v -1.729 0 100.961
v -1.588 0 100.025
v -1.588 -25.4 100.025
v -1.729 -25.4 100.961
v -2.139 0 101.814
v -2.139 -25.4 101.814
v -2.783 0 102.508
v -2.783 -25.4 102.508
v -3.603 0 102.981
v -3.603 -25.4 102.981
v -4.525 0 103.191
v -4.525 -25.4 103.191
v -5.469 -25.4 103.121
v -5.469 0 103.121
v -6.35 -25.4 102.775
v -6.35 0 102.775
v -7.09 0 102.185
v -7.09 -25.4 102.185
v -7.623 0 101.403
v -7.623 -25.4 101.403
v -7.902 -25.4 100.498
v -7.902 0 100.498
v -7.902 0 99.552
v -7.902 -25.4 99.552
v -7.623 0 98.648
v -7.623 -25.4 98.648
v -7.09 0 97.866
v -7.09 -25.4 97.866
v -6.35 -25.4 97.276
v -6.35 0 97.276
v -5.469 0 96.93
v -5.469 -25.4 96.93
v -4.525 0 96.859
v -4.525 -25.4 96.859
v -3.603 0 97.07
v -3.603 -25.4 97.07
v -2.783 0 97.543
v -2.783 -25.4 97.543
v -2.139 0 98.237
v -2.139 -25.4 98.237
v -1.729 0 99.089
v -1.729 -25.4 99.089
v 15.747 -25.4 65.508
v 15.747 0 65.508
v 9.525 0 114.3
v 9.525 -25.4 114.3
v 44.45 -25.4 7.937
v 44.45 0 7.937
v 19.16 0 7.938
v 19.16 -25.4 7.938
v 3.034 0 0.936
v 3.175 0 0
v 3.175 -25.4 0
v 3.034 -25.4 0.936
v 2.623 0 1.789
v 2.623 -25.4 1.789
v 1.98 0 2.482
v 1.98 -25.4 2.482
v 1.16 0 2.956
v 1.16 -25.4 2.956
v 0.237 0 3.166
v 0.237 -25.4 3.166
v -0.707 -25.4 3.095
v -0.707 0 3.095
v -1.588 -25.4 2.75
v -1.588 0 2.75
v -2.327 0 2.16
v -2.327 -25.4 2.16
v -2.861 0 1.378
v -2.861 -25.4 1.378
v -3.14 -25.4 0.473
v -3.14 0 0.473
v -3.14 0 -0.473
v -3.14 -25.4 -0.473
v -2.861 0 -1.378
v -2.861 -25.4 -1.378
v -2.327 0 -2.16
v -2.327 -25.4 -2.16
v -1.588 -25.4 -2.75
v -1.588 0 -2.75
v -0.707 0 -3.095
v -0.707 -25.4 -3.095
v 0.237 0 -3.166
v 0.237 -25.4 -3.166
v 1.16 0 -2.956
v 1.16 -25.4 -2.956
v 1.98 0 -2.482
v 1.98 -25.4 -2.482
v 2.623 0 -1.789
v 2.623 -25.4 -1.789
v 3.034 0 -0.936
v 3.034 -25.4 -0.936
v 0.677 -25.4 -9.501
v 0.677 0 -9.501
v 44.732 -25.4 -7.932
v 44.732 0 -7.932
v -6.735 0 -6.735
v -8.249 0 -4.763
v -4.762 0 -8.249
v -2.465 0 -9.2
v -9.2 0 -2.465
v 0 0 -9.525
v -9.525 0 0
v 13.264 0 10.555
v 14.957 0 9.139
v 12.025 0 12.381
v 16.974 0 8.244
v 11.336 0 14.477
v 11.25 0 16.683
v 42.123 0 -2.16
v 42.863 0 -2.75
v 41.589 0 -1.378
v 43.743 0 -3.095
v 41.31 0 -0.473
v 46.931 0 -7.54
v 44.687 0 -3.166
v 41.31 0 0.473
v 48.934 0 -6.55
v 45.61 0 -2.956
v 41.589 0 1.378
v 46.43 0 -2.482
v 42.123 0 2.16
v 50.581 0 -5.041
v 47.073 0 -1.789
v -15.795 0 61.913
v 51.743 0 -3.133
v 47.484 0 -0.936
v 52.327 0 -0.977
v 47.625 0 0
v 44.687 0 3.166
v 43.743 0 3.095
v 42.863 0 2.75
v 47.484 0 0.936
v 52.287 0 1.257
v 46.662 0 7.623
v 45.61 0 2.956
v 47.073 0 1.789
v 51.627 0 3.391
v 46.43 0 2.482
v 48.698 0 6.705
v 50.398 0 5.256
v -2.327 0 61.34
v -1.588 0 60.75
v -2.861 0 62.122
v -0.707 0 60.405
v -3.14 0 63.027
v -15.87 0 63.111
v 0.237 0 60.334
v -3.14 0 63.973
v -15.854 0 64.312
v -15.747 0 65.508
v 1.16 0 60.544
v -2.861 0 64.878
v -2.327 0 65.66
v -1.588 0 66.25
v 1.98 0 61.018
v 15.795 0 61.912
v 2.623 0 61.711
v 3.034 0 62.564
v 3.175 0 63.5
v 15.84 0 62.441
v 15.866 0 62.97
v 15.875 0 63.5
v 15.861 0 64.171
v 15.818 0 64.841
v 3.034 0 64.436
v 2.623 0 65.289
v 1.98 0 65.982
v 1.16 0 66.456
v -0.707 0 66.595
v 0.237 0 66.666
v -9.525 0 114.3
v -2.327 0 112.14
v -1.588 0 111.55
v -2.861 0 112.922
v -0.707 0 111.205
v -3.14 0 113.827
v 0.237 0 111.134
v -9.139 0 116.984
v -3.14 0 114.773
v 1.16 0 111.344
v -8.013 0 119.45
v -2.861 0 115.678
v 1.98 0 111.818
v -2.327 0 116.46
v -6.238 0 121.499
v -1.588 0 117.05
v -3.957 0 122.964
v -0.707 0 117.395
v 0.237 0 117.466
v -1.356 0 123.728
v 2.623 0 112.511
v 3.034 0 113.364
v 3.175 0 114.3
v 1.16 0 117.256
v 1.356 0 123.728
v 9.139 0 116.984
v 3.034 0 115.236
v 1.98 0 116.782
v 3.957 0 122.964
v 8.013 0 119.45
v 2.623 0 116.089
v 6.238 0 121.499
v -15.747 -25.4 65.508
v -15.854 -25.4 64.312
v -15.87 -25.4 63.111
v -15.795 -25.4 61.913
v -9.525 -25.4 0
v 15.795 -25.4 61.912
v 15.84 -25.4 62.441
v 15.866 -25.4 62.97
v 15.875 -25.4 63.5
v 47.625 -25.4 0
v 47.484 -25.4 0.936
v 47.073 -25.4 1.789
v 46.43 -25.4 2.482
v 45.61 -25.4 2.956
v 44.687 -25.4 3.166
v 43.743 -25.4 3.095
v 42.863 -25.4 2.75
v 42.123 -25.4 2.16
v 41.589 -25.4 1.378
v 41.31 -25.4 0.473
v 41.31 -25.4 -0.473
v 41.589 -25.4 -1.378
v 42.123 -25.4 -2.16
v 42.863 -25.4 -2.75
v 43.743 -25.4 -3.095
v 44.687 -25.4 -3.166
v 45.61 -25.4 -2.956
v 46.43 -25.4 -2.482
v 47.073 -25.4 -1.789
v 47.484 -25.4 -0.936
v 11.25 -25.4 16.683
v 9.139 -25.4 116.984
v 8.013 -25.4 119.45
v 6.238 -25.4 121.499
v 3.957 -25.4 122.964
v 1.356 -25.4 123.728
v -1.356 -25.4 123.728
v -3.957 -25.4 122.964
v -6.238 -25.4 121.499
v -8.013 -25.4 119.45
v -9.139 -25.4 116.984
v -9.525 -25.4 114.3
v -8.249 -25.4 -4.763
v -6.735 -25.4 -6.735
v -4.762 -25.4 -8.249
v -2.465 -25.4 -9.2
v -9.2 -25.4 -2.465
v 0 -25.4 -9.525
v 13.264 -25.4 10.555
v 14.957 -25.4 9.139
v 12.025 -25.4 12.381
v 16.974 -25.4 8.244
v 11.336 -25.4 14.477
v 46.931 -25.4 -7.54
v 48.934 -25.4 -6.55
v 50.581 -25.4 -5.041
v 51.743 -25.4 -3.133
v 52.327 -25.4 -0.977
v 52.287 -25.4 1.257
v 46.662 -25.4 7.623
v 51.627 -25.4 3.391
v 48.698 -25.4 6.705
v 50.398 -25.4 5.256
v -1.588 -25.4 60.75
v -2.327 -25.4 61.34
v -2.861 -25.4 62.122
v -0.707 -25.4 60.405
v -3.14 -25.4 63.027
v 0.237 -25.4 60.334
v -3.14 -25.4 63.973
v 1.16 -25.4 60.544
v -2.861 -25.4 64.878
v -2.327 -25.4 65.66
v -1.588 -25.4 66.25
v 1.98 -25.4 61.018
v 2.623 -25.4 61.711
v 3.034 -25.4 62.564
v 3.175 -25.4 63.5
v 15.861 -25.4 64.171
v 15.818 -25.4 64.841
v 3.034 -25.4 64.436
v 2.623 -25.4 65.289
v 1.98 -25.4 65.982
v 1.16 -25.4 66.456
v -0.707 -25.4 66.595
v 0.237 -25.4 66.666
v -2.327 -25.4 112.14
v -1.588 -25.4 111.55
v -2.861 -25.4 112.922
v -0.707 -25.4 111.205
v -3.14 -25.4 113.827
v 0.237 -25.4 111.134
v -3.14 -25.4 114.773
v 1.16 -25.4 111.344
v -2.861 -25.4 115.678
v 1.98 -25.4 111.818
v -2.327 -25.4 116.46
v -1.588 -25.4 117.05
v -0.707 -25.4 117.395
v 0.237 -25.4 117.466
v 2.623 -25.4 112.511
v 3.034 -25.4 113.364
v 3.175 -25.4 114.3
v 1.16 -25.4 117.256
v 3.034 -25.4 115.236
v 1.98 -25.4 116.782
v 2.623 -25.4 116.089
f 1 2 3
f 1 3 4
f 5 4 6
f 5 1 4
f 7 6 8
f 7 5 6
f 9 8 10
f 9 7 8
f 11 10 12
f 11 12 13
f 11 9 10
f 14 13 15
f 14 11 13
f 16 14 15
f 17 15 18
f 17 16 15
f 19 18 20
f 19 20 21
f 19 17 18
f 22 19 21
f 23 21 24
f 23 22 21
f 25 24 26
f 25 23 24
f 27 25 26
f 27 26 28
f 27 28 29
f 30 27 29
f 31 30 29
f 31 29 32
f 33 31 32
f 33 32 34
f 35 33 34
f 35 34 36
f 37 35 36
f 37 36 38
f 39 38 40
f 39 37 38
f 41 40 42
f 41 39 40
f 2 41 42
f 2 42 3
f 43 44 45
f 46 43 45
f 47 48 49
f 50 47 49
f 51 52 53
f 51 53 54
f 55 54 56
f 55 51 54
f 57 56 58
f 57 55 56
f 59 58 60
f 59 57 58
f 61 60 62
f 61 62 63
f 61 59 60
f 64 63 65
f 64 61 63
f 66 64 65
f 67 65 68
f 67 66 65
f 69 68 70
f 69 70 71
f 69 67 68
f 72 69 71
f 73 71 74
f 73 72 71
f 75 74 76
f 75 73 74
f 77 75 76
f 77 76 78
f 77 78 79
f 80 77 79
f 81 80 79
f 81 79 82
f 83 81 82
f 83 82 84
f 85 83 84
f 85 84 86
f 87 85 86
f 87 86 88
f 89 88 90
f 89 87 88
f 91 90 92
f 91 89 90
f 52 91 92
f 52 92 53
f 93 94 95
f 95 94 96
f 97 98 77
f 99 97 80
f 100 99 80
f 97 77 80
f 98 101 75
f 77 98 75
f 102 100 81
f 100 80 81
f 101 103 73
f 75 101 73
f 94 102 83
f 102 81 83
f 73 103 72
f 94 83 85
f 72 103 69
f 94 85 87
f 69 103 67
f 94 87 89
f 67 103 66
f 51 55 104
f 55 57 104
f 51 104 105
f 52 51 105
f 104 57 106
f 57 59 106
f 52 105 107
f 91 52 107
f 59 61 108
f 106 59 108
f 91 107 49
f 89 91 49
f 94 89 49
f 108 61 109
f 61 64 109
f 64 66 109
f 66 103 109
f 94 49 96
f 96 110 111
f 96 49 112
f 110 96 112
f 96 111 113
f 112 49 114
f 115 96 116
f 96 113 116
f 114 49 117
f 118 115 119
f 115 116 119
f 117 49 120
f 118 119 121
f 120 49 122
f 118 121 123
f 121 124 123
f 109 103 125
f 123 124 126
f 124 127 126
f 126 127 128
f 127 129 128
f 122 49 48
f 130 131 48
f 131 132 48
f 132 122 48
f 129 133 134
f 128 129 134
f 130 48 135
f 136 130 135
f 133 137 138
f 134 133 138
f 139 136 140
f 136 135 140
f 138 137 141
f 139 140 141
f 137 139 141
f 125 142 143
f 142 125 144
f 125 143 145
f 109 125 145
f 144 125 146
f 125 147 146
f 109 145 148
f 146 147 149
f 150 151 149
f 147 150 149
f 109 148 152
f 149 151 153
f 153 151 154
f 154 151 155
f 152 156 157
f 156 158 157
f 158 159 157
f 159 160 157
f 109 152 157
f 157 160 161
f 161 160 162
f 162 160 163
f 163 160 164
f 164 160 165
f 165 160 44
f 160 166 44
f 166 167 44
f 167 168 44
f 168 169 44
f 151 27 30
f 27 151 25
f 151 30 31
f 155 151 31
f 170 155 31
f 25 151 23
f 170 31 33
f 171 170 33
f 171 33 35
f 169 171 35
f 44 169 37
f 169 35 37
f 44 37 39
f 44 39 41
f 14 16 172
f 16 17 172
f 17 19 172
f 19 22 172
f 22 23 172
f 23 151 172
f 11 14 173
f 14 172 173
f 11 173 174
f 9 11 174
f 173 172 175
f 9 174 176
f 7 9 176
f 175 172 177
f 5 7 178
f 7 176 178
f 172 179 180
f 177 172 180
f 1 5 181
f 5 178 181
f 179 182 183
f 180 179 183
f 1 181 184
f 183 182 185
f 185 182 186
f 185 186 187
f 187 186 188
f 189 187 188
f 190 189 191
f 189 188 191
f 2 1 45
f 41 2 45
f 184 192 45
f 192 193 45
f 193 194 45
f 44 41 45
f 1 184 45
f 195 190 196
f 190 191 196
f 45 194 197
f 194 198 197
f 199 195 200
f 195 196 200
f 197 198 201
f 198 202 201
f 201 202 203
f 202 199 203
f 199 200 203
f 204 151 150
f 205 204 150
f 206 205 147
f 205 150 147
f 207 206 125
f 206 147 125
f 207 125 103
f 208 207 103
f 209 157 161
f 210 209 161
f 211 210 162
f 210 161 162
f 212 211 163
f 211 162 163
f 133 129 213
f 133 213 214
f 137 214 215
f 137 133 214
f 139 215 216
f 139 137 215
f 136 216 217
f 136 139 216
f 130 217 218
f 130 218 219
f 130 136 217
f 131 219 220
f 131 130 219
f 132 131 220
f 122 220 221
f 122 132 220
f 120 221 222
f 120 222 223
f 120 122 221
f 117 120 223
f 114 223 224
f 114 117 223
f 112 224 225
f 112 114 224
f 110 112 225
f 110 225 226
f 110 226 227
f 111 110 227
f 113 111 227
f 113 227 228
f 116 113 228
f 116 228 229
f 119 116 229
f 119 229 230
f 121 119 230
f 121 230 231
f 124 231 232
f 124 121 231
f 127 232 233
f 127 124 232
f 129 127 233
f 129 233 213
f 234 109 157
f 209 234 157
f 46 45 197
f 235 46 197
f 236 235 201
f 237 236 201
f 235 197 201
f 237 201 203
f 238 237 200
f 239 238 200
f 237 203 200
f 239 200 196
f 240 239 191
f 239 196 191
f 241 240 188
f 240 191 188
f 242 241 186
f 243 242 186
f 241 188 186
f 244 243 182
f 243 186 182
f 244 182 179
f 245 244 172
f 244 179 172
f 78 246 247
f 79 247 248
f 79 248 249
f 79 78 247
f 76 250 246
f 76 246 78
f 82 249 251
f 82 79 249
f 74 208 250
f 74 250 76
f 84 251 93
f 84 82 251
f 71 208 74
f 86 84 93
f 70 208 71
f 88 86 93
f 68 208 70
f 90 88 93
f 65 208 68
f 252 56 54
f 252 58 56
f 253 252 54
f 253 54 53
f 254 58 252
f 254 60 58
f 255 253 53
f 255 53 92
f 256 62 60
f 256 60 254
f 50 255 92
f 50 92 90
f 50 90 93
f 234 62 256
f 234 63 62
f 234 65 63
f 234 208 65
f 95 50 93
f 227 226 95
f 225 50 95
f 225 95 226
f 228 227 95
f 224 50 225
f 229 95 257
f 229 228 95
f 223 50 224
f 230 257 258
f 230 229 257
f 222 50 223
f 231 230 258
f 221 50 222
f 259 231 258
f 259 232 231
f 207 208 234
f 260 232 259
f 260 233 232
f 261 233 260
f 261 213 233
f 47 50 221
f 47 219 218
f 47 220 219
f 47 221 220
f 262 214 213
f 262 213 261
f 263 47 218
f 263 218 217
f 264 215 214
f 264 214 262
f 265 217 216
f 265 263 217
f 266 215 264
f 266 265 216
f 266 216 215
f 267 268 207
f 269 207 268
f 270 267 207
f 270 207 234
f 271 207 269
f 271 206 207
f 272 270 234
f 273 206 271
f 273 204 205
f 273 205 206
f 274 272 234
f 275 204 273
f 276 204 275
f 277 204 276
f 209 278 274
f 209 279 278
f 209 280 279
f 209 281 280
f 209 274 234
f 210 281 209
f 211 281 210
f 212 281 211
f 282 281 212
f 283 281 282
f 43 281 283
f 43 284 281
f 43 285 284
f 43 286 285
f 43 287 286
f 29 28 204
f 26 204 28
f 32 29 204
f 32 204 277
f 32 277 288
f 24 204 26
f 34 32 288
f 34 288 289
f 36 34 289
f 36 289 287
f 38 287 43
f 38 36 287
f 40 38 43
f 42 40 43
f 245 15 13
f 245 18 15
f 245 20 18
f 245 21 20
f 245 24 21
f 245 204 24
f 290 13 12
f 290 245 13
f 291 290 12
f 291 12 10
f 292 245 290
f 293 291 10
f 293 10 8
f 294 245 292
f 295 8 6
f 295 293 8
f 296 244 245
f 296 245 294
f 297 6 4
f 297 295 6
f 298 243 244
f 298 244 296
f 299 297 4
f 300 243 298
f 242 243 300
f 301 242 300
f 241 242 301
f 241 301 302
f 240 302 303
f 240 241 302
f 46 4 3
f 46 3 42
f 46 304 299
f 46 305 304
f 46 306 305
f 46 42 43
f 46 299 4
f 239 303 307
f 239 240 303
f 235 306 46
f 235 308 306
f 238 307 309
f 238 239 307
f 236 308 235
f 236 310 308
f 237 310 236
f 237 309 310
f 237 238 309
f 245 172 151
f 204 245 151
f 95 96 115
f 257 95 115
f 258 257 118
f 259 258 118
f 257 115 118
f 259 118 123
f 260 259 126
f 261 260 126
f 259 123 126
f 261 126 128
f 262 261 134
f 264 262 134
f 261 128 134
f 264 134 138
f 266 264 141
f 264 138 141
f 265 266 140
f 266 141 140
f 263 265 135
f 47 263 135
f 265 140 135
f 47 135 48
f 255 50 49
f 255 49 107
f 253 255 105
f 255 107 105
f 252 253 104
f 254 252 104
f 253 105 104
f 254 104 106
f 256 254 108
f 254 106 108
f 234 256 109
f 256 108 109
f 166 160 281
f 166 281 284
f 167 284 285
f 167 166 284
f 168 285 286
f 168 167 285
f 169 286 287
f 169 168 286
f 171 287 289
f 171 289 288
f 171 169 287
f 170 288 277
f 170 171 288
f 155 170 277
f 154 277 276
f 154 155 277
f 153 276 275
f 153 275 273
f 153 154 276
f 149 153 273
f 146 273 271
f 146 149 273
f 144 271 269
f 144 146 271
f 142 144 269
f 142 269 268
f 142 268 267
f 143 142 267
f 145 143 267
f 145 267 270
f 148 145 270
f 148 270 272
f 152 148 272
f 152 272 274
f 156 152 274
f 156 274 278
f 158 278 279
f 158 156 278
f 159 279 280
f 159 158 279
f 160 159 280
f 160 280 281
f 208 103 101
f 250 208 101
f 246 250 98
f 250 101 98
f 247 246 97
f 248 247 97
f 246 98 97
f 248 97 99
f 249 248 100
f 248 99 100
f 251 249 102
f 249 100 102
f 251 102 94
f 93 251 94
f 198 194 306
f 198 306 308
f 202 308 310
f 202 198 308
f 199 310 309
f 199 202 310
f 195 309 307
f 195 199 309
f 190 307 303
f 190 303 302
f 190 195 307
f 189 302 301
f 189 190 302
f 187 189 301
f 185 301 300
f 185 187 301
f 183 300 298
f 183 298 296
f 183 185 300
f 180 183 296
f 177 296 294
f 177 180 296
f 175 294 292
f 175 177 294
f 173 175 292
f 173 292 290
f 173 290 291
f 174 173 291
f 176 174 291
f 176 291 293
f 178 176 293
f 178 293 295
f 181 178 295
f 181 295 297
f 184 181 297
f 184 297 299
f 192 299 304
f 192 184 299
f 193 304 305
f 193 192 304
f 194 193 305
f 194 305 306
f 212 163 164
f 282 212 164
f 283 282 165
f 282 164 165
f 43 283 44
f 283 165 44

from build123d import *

# Parameters (mm, degrees)
F0_R     = 3.175
F1_DEPTH = 25.4


# Not quite as in the source:
# - ends of sketch curves that miss each other by under 0.0002 mm in the source are joined


with BuildPart() as f1:
    # F0 (on Front) → F1 (new body)
    with BuildSketch(Plane.XZ):
        with BuildLine():
            ThreePointArc((9.525, 114.3), (0, 123.825), (-9.525, 114.3))
            ThreePointArc((-9.525, 114.3), (0, 104.775), (9.525, 114.3))
        make_face()
        with Locations((0, 114.3)):
            Circle(F0_R, mode=Mode.SUBTRACT)
        with BuildLine():
            Line((-9.525, 114.3), (-15.7474569047, 65.5082893304))
            ThreePointArc((-15.7474569047, 65.5082893304), (0, 79.375), (15.7474569047, 65.5082893304))
            Line((15.7474569047, 65.5082893304), (9.525, 114.3))
            ThreePointArc((9.525, 114.3), (0, 104.775), (-9.525, 114.3))
        make_face()
        with Locations((-4.7625, 100.0252)):
            Circle(F0_R, mode=Mode.SUBTRACT)
        with BuildLine():
            ThreePointArc((-9.525, 0), (0, 9.525), (9.525, 0))
            ThreePointArc((9.525, 0), (6.9705567315, -6.4912990883), (0.6773435479, -9.500885786))
            Line((0.6773435479, -9.500885786), (44.7324052746, -7.9324746146))
            ThreePointArc((44.7324052746, -7.9324746146), (36.5137564458, -0.1412249921), (44.45, 7.9375))
            Line((44.45, 7.9375), (19.160010759, 7.9375))
            ThreePointArc((19.160010759, 7.9375), (13.2639846378, 10.5545437096), (11.2496616365, 16.68272))
            Line((11.2496616365, 16.68272), (15.7954255641, 61.9125))
            ThreePointArc((15.7954255641, 61.9125), (15.8550939106, 62.7052534459), (15.875, 63.5))
            ThreePointArc((15.875, 63.5), (15.8430821396, 64.5061676396), (15.7474569047, 65.5082893304))
            ThreePointArc((15.7474569047, 65.5082893304), (0, 79.375), (-15.7474569047, 65.5082893304))
            ThreePointArc((-15.7474569047, 65.5082893304), (-15.8735876139, 63.7117575563), (-15.795425611, 61.9125004674))
            Line((-15.795425611, 61.9125004674), (-9.525, 0))
        make_face()
        with Locations((0, 63.5)):
            Circle(F0_R, mode=Mode.SUBTRACT)
        with BuildLine():
            ThreePointArc((0.6773435479, -9.500885786), (6.9705567315, -6.4912990883), (9.525, 0))
            ThreePointArc((9.525, 0), (0, 9.525), (-9.525, 0))
            ThreePointArc((-9.525, 0), (-6.7351920908, -6.7351920908), (0, -9.525))
            Line((0, -9.525), (0.6773435479, -9.500885786))
        make_face()
        Circle(F0_R, mode=Mode.SUBTRACT)
        with BuildLine():
            ThreePointArc((44.45, 7.9375), (36.5137564458, -0.1412249921), (44.7324052746, -7.9324746146))
            ThreePointArc((44.7324052746, -7.9324746146), (50.1616327839, -5.5119104847), (52.3875, 0))
            ThreePointArc((52.3875, 0), (50.0626600757, 5.6126600757), (44.45, 7.9375))
        make_face()
        with Locations((44.45, 0)):
            Circle(F0_R, mode=Mode.SUBTRACT)
    extrude(amount=F1_DEPTH)


solid = f1.part
